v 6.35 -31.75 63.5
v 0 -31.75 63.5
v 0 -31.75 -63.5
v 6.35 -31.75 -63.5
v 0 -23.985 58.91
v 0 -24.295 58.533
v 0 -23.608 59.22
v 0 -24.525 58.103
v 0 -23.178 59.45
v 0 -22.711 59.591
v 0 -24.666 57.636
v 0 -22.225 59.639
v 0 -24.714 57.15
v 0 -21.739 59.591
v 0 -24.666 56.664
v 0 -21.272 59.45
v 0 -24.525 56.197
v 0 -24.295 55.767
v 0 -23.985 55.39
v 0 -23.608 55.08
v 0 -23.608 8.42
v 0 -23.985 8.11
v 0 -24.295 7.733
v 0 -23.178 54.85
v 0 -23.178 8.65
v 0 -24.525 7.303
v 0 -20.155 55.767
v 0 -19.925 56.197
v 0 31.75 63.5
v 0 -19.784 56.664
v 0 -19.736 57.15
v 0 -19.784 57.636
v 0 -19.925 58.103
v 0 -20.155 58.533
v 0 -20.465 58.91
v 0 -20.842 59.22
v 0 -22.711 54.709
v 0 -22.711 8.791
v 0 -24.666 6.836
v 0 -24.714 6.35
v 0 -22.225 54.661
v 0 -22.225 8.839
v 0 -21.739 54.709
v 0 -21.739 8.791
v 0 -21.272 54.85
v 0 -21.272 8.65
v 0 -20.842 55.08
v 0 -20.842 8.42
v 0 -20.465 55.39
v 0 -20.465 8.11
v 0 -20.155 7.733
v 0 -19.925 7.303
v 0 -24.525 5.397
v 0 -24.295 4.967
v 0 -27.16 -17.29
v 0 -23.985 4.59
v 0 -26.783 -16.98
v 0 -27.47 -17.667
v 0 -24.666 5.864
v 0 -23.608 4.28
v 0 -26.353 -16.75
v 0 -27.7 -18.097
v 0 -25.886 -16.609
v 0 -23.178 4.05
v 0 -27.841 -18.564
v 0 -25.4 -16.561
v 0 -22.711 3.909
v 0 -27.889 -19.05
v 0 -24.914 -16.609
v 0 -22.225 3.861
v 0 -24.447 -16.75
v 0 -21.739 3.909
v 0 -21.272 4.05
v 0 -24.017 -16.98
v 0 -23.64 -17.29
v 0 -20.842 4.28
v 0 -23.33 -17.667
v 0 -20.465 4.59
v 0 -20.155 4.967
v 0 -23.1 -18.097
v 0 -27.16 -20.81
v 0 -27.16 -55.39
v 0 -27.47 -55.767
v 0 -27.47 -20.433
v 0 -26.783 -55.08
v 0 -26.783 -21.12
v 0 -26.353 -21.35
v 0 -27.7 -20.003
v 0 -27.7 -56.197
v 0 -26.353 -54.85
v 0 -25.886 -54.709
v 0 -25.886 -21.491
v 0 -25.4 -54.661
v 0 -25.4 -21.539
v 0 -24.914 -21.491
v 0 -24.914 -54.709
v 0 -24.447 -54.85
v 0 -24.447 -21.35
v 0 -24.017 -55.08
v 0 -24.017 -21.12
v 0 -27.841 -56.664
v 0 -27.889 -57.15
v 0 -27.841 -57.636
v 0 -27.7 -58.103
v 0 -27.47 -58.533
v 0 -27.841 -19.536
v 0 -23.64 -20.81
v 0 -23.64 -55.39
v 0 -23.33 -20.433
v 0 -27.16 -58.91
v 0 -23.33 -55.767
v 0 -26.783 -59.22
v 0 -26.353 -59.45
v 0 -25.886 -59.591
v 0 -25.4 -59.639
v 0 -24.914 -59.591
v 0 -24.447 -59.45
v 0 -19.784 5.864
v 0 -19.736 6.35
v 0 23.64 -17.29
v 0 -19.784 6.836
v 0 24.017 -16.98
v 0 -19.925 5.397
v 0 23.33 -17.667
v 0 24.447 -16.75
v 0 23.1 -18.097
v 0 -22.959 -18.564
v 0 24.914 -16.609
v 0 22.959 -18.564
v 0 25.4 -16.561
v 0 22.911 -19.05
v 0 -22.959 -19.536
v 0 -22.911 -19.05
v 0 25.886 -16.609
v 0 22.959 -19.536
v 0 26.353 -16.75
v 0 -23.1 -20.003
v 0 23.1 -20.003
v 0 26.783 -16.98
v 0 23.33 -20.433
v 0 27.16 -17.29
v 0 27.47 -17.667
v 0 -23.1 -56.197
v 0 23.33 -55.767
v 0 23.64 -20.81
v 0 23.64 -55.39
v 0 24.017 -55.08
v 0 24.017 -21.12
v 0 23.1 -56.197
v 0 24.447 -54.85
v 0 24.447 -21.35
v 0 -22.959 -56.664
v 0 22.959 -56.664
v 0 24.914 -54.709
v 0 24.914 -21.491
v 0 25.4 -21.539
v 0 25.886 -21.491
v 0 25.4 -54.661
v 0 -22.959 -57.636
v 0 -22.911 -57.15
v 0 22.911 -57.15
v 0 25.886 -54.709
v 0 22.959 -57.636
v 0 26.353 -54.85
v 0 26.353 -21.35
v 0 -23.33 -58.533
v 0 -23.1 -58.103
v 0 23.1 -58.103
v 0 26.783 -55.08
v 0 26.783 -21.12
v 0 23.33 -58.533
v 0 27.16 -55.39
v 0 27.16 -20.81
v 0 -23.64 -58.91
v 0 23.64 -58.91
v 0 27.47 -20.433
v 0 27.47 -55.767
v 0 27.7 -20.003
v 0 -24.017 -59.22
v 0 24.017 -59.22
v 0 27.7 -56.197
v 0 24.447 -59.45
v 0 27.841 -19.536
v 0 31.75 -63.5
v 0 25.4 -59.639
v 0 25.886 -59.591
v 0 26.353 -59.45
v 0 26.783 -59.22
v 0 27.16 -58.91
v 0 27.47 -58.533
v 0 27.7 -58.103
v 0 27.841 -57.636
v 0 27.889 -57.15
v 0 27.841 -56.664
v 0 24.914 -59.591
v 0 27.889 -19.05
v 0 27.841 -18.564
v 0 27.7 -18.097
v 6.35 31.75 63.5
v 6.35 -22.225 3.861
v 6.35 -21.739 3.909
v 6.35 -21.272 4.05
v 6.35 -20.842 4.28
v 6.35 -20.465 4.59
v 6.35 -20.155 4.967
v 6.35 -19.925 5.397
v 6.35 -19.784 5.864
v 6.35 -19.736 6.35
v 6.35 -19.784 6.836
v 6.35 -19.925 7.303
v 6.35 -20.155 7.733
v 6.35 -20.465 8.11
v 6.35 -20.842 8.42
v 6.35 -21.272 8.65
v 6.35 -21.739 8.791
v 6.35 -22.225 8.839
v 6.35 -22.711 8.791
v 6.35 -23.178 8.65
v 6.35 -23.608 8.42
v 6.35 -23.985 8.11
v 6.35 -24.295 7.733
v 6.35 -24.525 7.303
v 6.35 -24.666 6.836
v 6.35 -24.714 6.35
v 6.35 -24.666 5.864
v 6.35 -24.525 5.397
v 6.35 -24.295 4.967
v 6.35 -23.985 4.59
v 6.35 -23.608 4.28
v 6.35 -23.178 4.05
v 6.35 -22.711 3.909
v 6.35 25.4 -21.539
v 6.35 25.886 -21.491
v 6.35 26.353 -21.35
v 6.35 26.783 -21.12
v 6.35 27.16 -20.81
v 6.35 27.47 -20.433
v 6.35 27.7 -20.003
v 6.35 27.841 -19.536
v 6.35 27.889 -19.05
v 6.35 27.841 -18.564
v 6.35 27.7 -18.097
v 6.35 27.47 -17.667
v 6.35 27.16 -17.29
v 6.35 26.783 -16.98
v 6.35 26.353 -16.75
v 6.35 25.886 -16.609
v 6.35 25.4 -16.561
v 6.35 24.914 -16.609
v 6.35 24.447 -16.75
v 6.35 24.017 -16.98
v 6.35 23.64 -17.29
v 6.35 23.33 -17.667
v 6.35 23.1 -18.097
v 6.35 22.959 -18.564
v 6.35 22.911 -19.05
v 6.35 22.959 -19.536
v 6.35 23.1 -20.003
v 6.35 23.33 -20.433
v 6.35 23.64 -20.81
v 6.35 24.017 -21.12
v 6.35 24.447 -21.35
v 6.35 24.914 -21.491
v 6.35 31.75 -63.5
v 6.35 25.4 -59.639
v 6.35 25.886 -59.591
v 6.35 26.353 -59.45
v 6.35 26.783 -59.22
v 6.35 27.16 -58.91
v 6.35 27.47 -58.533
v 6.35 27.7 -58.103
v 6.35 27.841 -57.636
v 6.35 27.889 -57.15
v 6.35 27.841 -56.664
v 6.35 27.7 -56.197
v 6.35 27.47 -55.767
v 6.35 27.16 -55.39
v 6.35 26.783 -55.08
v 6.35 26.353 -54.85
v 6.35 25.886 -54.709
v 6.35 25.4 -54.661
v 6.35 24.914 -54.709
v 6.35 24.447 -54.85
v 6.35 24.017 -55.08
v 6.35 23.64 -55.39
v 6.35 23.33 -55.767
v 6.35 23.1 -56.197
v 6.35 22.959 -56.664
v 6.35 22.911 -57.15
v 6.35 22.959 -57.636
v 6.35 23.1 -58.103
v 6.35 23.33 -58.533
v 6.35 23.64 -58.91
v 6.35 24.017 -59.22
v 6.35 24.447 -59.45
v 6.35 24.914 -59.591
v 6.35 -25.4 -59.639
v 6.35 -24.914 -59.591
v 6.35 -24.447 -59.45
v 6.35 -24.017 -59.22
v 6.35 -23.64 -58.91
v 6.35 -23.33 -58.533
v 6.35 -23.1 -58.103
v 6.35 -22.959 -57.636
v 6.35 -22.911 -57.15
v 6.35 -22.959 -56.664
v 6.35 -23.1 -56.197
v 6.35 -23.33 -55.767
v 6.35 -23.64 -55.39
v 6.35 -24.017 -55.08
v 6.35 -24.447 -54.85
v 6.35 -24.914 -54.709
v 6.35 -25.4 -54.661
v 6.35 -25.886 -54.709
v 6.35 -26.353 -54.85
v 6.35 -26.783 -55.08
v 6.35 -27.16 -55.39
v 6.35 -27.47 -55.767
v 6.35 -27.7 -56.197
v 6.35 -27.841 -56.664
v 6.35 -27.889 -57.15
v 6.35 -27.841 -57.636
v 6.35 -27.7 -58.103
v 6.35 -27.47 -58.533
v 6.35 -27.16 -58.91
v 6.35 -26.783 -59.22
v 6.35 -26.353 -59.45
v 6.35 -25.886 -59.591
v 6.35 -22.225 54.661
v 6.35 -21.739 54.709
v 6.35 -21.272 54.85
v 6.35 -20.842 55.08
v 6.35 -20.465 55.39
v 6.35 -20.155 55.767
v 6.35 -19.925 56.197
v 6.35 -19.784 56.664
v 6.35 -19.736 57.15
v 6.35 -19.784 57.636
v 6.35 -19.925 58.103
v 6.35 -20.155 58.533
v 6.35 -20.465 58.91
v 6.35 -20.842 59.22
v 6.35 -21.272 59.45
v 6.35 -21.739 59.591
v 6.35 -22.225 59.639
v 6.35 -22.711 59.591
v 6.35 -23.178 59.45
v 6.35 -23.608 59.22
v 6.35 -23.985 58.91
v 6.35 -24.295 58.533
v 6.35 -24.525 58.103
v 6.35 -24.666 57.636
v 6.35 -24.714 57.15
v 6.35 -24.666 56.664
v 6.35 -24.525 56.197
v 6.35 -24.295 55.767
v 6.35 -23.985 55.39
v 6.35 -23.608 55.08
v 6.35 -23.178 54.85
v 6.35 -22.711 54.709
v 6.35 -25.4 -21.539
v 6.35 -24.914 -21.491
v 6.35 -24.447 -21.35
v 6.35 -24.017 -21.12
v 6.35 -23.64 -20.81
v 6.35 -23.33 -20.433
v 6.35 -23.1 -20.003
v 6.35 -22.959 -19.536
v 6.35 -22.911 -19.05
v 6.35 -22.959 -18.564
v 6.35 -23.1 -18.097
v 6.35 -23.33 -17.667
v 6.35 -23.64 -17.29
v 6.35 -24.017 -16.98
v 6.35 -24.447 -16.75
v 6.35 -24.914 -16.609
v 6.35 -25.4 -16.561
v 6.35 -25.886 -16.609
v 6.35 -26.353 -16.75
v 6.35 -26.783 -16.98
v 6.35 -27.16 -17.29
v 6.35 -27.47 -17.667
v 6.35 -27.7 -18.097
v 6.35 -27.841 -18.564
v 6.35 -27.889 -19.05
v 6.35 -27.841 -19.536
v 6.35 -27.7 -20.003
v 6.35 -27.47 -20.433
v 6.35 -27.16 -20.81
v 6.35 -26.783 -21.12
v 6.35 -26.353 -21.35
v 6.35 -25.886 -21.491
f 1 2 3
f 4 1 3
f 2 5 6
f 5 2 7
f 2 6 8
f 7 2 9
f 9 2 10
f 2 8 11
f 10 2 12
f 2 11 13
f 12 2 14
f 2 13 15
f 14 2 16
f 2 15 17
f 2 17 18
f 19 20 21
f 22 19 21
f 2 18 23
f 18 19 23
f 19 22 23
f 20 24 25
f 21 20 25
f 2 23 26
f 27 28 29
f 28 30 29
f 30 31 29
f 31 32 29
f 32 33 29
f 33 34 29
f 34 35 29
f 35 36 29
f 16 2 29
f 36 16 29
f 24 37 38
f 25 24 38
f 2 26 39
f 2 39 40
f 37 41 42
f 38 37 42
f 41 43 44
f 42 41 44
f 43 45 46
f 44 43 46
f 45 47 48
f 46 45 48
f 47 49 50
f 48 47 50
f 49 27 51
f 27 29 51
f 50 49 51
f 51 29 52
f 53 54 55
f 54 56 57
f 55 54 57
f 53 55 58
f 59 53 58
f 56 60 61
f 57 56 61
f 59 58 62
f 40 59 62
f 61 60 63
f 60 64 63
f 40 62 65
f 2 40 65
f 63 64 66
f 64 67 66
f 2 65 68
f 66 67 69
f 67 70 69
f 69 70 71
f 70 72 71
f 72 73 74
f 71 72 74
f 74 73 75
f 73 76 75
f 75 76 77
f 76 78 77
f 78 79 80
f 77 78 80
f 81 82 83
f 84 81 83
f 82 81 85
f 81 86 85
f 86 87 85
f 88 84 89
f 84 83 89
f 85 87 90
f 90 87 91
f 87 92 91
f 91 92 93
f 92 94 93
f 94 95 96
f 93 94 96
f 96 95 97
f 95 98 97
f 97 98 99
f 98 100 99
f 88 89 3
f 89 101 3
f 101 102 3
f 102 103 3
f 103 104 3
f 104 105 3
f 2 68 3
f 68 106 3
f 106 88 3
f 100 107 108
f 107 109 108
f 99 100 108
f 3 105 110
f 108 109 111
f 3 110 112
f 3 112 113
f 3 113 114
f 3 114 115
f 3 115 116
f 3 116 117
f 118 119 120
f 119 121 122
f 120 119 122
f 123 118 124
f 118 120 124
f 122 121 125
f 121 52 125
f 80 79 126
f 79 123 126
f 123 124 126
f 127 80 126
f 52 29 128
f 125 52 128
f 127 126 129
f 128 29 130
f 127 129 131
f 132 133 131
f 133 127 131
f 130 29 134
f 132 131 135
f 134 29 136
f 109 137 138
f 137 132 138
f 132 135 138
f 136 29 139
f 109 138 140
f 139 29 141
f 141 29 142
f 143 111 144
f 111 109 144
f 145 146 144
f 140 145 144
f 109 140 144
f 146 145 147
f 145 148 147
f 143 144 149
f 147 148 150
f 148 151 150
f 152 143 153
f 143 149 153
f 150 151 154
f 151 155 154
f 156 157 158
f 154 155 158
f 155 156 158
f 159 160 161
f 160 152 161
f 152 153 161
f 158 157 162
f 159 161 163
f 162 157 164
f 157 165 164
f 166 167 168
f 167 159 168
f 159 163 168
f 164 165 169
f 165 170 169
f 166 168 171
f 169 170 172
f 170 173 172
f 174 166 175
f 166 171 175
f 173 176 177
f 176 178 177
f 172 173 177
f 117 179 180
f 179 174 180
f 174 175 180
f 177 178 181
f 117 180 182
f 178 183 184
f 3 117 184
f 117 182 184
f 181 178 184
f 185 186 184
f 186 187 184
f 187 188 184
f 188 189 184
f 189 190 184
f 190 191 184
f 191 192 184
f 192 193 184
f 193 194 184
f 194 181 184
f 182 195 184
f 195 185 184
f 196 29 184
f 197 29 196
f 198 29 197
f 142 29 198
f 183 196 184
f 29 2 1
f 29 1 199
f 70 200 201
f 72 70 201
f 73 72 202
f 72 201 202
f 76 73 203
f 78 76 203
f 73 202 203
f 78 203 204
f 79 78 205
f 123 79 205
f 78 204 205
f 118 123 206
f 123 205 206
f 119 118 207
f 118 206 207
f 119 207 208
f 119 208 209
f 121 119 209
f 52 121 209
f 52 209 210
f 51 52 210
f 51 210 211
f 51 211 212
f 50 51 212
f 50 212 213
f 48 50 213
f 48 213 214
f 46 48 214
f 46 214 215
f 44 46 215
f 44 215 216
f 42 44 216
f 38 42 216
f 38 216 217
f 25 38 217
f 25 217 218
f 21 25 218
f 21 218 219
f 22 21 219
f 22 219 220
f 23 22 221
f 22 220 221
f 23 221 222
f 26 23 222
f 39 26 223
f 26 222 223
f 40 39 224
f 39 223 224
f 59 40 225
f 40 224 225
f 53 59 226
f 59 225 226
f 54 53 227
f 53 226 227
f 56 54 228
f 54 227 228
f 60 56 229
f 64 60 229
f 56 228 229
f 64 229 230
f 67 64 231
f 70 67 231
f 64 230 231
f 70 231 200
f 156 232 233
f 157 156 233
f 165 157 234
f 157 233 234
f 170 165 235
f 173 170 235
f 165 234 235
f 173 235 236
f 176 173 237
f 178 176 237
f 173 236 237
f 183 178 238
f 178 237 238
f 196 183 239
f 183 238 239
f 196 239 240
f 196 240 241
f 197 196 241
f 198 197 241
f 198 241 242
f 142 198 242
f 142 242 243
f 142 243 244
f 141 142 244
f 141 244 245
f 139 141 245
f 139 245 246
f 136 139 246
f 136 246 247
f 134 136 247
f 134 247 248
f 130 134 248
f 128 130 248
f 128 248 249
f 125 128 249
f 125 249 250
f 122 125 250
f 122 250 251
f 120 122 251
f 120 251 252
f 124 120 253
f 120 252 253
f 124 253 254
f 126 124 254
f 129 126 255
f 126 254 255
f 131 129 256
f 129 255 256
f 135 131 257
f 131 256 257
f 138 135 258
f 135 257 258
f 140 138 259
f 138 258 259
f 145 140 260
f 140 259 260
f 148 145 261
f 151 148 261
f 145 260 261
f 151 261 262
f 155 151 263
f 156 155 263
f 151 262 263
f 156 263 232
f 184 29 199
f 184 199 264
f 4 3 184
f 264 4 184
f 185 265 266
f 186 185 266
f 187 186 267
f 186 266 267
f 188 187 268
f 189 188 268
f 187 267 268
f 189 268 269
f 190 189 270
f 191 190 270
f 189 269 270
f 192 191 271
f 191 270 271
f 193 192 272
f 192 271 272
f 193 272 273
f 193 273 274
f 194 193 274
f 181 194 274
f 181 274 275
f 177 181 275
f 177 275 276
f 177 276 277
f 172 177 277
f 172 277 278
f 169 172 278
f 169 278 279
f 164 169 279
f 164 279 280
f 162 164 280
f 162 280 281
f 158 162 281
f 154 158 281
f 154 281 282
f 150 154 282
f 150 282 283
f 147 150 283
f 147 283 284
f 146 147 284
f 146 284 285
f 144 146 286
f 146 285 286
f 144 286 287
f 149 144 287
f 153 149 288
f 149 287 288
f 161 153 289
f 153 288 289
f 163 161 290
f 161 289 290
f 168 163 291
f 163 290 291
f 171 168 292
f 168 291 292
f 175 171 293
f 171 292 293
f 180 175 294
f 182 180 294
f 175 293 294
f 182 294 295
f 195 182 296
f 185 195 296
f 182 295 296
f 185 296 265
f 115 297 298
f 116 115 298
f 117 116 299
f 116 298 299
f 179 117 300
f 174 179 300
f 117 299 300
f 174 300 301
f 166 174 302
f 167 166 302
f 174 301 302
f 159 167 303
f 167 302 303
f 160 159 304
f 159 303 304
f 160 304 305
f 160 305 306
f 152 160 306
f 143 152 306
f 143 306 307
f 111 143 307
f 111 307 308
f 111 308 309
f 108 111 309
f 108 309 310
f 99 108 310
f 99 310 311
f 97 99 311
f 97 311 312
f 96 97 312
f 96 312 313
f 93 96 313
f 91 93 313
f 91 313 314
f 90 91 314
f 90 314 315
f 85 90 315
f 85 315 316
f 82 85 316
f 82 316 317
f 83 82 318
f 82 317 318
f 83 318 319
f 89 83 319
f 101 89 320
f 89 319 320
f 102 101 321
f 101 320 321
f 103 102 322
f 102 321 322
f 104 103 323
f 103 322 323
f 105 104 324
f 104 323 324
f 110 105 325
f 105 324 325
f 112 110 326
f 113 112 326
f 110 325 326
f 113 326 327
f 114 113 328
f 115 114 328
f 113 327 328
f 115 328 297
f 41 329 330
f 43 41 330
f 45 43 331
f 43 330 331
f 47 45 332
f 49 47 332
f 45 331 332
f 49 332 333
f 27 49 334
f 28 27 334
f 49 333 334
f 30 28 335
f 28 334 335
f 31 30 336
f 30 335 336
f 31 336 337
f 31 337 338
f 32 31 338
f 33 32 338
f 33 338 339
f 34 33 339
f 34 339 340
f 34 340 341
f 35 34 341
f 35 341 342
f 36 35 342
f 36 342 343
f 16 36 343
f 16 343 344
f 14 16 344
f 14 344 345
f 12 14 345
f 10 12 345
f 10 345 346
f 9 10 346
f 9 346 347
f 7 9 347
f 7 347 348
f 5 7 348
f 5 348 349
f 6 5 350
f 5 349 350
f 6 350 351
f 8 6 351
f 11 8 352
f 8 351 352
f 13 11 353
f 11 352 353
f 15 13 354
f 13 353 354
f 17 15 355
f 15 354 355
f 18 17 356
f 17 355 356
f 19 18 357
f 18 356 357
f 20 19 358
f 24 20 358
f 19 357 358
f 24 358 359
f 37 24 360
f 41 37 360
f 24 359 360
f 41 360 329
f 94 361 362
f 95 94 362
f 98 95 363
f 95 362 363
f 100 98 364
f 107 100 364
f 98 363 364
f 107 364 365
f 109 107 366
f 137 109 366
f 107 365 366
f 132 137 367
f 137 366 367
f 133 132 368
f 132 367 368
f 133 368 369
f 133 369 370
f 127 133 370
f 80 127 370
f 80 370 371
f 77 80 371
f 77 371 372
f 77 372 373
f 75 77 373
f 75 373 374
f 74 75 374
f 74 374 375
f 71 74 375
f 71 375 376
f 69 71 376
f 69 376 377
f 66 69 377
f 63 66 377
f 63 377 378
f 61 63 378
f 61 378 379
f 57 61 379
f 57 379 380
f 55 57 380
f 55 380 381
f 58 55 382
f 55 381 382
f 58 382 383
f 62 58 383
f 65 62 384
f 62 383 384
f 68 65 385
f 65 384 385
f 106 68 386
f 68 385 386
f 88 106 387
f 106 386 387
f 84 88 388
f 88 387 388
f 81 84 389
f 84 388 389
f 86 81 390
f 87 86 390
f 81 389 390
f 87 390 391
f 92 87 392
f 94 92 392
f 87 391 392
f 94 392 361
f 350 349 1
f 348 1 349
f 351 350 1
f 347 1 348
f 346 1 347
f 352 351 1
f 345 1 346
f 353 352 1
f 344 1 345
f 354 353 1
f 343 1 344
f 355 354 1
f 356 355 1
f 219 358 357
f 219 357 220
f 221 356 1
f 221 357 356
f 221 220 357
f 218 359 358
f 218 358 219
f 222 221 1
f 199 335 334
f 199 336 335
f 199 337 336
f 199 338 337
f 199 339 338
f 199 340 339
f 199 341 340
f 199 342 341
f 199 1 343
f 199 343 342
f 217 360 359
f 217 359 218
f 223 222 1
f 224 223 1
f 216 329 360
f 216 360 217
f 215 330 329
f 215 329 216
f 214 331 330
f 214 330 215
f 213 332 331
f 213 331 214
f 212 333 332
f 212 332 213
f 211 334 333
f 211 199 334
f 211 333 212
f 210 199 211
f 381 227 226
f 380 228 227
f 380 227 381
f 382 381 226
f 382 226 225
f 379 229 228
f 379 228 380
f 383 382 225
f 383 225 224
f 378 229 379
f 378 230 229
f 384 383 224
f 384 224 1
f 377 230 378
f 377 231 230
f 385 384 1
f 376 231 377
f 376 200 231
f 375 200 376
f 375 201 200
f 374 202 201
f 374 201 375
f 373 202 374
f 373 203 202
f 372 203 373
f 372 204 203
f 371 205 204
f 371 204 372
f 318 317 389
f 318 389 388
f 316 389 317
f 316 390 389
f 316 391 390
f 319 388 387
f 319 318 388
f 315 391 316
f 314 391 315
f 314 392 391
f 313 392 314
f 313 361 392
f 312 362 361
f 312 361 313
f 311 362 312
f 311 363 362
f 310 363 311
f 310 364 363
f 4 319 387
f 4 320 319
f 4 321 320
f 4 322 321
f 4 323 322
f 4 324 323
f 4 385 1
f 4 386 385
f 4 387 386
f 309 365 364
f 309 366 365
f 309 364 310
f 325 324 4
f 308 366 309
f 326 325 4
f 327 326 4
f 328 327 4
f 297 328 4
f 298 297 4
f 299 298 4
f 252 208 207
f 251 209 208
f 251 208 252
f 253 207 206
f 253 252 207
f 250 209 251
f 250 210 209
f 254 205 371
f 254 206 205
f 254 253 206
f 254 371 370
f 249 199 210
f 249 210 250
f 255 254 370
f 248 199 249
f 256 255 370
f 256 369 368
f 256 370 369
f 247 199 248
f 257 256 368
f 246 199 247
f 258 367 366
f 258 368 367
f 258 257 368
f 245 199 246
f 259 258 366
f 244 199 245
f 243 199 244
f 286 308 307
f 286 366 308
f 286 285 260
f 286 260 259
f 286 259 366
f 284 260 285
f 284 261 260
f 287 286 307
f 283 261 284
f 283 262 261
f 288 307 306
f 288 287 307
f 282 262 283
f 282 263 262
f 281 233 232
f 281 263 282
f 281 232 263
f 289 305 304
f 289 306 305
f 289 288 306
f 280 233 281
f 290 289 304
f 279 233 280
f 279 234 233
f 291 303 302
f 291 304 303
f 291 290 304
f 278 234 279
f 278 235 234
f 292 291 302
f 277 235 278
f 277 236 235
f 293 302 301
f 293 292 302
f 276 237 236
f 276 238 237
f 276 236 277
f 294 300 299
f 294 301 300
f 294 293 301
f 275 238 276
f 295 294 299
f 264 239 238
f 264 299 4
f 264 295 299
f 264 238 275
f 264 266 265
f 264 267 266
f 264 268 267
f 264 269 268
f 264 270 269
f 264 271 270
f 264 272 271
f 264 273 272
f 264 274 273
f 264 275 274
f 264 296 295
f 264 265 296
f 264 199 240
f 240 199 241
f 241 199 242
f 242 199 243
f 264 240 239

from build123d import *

# Parameters (mm, degrees)
SKETCH1_W                      = 127
SKETCH1_H                      = 63.5
BOSS_EXTRUDE1_DEPTH            = 6.35
F_9_0_196_DIAMETER_HOLE1_D     = 4.9784
F_9_0_196_DIAMETER_HOLE1_DEPTH = 70.104
F_9_0_196_DIAMETER_HOLE1_TIP   = 1.495662253
F_9_0_196_DIAMETER_HOLE2_D     = 4.9784
F_9_0_196_DIAMETER_HOLE2_DEPTH = 70.104
F_9_0_196_DIAMETER_HOLE2_TIP   = 1.495662253


with BuildPart() as part:
    # Sketch1 → Boss-Extrude1 (new body)
    with BuildSketch(Plane(origin=(0, 0, 0), x_dir=(0, 0, -1), z_dir=(1, 0, 0))):
        Rectangle(SKETCH1_W, SKETCH1_H)
    extrude(amount=BOSS_EXTRUDE1_DEPTH)

    # #9 (0.196) Diameter Hole1
    with Locations(Plane.ZY):
        with Locations((57.15, -22.225), (6.35, -22.225)):
            Hole(F_9_0_196_DIAMETER_HOLE1_D / 2, depth=F_9_0_196_DIAMETER_HOLE1_DEPTH)
            with Locations((0, 0, -(F_9_0_196_DIAMETER_HOLE1_DEPTH + F_9_0_196_DIAMETER_HOLE1_TIP / 2))):  # 118° drill point
                Cone(0, F_9_0_196_DIAMETER_HOLE1_D / 2, F_9_0_196_DIAMETER_HOLE1_TIP, mode=Mode.SUBTRACT)

    # #9 (0.196) Diameter Hole2
    with Locations(Plane.ZY):
        with Locations((-57.15, -25.4), (-19.05, -25.4), (-19.05, 25.4), (-57.15, 25.4)):
            Hole(F_9_0_196_DIAMETER_HOLE2_D / 2, depth=F_9_0_196_DIAMETER_HOLE2_DEPTH)
            with Locations((0, 0, -(F_9_0_196_DIAMETER_HOLE2_DEPTH + F_9_0_196_DIAMETER_HOLE2_TIP / 2))):  # 118° drill point
                Cone(0, F_9_0_196_DIAMETER_HOLE2_D / 2, F_9_0_196_DIAMETER_HOLE2_TIP, mode=Mode.SUBTRACT)


solid = part.part
